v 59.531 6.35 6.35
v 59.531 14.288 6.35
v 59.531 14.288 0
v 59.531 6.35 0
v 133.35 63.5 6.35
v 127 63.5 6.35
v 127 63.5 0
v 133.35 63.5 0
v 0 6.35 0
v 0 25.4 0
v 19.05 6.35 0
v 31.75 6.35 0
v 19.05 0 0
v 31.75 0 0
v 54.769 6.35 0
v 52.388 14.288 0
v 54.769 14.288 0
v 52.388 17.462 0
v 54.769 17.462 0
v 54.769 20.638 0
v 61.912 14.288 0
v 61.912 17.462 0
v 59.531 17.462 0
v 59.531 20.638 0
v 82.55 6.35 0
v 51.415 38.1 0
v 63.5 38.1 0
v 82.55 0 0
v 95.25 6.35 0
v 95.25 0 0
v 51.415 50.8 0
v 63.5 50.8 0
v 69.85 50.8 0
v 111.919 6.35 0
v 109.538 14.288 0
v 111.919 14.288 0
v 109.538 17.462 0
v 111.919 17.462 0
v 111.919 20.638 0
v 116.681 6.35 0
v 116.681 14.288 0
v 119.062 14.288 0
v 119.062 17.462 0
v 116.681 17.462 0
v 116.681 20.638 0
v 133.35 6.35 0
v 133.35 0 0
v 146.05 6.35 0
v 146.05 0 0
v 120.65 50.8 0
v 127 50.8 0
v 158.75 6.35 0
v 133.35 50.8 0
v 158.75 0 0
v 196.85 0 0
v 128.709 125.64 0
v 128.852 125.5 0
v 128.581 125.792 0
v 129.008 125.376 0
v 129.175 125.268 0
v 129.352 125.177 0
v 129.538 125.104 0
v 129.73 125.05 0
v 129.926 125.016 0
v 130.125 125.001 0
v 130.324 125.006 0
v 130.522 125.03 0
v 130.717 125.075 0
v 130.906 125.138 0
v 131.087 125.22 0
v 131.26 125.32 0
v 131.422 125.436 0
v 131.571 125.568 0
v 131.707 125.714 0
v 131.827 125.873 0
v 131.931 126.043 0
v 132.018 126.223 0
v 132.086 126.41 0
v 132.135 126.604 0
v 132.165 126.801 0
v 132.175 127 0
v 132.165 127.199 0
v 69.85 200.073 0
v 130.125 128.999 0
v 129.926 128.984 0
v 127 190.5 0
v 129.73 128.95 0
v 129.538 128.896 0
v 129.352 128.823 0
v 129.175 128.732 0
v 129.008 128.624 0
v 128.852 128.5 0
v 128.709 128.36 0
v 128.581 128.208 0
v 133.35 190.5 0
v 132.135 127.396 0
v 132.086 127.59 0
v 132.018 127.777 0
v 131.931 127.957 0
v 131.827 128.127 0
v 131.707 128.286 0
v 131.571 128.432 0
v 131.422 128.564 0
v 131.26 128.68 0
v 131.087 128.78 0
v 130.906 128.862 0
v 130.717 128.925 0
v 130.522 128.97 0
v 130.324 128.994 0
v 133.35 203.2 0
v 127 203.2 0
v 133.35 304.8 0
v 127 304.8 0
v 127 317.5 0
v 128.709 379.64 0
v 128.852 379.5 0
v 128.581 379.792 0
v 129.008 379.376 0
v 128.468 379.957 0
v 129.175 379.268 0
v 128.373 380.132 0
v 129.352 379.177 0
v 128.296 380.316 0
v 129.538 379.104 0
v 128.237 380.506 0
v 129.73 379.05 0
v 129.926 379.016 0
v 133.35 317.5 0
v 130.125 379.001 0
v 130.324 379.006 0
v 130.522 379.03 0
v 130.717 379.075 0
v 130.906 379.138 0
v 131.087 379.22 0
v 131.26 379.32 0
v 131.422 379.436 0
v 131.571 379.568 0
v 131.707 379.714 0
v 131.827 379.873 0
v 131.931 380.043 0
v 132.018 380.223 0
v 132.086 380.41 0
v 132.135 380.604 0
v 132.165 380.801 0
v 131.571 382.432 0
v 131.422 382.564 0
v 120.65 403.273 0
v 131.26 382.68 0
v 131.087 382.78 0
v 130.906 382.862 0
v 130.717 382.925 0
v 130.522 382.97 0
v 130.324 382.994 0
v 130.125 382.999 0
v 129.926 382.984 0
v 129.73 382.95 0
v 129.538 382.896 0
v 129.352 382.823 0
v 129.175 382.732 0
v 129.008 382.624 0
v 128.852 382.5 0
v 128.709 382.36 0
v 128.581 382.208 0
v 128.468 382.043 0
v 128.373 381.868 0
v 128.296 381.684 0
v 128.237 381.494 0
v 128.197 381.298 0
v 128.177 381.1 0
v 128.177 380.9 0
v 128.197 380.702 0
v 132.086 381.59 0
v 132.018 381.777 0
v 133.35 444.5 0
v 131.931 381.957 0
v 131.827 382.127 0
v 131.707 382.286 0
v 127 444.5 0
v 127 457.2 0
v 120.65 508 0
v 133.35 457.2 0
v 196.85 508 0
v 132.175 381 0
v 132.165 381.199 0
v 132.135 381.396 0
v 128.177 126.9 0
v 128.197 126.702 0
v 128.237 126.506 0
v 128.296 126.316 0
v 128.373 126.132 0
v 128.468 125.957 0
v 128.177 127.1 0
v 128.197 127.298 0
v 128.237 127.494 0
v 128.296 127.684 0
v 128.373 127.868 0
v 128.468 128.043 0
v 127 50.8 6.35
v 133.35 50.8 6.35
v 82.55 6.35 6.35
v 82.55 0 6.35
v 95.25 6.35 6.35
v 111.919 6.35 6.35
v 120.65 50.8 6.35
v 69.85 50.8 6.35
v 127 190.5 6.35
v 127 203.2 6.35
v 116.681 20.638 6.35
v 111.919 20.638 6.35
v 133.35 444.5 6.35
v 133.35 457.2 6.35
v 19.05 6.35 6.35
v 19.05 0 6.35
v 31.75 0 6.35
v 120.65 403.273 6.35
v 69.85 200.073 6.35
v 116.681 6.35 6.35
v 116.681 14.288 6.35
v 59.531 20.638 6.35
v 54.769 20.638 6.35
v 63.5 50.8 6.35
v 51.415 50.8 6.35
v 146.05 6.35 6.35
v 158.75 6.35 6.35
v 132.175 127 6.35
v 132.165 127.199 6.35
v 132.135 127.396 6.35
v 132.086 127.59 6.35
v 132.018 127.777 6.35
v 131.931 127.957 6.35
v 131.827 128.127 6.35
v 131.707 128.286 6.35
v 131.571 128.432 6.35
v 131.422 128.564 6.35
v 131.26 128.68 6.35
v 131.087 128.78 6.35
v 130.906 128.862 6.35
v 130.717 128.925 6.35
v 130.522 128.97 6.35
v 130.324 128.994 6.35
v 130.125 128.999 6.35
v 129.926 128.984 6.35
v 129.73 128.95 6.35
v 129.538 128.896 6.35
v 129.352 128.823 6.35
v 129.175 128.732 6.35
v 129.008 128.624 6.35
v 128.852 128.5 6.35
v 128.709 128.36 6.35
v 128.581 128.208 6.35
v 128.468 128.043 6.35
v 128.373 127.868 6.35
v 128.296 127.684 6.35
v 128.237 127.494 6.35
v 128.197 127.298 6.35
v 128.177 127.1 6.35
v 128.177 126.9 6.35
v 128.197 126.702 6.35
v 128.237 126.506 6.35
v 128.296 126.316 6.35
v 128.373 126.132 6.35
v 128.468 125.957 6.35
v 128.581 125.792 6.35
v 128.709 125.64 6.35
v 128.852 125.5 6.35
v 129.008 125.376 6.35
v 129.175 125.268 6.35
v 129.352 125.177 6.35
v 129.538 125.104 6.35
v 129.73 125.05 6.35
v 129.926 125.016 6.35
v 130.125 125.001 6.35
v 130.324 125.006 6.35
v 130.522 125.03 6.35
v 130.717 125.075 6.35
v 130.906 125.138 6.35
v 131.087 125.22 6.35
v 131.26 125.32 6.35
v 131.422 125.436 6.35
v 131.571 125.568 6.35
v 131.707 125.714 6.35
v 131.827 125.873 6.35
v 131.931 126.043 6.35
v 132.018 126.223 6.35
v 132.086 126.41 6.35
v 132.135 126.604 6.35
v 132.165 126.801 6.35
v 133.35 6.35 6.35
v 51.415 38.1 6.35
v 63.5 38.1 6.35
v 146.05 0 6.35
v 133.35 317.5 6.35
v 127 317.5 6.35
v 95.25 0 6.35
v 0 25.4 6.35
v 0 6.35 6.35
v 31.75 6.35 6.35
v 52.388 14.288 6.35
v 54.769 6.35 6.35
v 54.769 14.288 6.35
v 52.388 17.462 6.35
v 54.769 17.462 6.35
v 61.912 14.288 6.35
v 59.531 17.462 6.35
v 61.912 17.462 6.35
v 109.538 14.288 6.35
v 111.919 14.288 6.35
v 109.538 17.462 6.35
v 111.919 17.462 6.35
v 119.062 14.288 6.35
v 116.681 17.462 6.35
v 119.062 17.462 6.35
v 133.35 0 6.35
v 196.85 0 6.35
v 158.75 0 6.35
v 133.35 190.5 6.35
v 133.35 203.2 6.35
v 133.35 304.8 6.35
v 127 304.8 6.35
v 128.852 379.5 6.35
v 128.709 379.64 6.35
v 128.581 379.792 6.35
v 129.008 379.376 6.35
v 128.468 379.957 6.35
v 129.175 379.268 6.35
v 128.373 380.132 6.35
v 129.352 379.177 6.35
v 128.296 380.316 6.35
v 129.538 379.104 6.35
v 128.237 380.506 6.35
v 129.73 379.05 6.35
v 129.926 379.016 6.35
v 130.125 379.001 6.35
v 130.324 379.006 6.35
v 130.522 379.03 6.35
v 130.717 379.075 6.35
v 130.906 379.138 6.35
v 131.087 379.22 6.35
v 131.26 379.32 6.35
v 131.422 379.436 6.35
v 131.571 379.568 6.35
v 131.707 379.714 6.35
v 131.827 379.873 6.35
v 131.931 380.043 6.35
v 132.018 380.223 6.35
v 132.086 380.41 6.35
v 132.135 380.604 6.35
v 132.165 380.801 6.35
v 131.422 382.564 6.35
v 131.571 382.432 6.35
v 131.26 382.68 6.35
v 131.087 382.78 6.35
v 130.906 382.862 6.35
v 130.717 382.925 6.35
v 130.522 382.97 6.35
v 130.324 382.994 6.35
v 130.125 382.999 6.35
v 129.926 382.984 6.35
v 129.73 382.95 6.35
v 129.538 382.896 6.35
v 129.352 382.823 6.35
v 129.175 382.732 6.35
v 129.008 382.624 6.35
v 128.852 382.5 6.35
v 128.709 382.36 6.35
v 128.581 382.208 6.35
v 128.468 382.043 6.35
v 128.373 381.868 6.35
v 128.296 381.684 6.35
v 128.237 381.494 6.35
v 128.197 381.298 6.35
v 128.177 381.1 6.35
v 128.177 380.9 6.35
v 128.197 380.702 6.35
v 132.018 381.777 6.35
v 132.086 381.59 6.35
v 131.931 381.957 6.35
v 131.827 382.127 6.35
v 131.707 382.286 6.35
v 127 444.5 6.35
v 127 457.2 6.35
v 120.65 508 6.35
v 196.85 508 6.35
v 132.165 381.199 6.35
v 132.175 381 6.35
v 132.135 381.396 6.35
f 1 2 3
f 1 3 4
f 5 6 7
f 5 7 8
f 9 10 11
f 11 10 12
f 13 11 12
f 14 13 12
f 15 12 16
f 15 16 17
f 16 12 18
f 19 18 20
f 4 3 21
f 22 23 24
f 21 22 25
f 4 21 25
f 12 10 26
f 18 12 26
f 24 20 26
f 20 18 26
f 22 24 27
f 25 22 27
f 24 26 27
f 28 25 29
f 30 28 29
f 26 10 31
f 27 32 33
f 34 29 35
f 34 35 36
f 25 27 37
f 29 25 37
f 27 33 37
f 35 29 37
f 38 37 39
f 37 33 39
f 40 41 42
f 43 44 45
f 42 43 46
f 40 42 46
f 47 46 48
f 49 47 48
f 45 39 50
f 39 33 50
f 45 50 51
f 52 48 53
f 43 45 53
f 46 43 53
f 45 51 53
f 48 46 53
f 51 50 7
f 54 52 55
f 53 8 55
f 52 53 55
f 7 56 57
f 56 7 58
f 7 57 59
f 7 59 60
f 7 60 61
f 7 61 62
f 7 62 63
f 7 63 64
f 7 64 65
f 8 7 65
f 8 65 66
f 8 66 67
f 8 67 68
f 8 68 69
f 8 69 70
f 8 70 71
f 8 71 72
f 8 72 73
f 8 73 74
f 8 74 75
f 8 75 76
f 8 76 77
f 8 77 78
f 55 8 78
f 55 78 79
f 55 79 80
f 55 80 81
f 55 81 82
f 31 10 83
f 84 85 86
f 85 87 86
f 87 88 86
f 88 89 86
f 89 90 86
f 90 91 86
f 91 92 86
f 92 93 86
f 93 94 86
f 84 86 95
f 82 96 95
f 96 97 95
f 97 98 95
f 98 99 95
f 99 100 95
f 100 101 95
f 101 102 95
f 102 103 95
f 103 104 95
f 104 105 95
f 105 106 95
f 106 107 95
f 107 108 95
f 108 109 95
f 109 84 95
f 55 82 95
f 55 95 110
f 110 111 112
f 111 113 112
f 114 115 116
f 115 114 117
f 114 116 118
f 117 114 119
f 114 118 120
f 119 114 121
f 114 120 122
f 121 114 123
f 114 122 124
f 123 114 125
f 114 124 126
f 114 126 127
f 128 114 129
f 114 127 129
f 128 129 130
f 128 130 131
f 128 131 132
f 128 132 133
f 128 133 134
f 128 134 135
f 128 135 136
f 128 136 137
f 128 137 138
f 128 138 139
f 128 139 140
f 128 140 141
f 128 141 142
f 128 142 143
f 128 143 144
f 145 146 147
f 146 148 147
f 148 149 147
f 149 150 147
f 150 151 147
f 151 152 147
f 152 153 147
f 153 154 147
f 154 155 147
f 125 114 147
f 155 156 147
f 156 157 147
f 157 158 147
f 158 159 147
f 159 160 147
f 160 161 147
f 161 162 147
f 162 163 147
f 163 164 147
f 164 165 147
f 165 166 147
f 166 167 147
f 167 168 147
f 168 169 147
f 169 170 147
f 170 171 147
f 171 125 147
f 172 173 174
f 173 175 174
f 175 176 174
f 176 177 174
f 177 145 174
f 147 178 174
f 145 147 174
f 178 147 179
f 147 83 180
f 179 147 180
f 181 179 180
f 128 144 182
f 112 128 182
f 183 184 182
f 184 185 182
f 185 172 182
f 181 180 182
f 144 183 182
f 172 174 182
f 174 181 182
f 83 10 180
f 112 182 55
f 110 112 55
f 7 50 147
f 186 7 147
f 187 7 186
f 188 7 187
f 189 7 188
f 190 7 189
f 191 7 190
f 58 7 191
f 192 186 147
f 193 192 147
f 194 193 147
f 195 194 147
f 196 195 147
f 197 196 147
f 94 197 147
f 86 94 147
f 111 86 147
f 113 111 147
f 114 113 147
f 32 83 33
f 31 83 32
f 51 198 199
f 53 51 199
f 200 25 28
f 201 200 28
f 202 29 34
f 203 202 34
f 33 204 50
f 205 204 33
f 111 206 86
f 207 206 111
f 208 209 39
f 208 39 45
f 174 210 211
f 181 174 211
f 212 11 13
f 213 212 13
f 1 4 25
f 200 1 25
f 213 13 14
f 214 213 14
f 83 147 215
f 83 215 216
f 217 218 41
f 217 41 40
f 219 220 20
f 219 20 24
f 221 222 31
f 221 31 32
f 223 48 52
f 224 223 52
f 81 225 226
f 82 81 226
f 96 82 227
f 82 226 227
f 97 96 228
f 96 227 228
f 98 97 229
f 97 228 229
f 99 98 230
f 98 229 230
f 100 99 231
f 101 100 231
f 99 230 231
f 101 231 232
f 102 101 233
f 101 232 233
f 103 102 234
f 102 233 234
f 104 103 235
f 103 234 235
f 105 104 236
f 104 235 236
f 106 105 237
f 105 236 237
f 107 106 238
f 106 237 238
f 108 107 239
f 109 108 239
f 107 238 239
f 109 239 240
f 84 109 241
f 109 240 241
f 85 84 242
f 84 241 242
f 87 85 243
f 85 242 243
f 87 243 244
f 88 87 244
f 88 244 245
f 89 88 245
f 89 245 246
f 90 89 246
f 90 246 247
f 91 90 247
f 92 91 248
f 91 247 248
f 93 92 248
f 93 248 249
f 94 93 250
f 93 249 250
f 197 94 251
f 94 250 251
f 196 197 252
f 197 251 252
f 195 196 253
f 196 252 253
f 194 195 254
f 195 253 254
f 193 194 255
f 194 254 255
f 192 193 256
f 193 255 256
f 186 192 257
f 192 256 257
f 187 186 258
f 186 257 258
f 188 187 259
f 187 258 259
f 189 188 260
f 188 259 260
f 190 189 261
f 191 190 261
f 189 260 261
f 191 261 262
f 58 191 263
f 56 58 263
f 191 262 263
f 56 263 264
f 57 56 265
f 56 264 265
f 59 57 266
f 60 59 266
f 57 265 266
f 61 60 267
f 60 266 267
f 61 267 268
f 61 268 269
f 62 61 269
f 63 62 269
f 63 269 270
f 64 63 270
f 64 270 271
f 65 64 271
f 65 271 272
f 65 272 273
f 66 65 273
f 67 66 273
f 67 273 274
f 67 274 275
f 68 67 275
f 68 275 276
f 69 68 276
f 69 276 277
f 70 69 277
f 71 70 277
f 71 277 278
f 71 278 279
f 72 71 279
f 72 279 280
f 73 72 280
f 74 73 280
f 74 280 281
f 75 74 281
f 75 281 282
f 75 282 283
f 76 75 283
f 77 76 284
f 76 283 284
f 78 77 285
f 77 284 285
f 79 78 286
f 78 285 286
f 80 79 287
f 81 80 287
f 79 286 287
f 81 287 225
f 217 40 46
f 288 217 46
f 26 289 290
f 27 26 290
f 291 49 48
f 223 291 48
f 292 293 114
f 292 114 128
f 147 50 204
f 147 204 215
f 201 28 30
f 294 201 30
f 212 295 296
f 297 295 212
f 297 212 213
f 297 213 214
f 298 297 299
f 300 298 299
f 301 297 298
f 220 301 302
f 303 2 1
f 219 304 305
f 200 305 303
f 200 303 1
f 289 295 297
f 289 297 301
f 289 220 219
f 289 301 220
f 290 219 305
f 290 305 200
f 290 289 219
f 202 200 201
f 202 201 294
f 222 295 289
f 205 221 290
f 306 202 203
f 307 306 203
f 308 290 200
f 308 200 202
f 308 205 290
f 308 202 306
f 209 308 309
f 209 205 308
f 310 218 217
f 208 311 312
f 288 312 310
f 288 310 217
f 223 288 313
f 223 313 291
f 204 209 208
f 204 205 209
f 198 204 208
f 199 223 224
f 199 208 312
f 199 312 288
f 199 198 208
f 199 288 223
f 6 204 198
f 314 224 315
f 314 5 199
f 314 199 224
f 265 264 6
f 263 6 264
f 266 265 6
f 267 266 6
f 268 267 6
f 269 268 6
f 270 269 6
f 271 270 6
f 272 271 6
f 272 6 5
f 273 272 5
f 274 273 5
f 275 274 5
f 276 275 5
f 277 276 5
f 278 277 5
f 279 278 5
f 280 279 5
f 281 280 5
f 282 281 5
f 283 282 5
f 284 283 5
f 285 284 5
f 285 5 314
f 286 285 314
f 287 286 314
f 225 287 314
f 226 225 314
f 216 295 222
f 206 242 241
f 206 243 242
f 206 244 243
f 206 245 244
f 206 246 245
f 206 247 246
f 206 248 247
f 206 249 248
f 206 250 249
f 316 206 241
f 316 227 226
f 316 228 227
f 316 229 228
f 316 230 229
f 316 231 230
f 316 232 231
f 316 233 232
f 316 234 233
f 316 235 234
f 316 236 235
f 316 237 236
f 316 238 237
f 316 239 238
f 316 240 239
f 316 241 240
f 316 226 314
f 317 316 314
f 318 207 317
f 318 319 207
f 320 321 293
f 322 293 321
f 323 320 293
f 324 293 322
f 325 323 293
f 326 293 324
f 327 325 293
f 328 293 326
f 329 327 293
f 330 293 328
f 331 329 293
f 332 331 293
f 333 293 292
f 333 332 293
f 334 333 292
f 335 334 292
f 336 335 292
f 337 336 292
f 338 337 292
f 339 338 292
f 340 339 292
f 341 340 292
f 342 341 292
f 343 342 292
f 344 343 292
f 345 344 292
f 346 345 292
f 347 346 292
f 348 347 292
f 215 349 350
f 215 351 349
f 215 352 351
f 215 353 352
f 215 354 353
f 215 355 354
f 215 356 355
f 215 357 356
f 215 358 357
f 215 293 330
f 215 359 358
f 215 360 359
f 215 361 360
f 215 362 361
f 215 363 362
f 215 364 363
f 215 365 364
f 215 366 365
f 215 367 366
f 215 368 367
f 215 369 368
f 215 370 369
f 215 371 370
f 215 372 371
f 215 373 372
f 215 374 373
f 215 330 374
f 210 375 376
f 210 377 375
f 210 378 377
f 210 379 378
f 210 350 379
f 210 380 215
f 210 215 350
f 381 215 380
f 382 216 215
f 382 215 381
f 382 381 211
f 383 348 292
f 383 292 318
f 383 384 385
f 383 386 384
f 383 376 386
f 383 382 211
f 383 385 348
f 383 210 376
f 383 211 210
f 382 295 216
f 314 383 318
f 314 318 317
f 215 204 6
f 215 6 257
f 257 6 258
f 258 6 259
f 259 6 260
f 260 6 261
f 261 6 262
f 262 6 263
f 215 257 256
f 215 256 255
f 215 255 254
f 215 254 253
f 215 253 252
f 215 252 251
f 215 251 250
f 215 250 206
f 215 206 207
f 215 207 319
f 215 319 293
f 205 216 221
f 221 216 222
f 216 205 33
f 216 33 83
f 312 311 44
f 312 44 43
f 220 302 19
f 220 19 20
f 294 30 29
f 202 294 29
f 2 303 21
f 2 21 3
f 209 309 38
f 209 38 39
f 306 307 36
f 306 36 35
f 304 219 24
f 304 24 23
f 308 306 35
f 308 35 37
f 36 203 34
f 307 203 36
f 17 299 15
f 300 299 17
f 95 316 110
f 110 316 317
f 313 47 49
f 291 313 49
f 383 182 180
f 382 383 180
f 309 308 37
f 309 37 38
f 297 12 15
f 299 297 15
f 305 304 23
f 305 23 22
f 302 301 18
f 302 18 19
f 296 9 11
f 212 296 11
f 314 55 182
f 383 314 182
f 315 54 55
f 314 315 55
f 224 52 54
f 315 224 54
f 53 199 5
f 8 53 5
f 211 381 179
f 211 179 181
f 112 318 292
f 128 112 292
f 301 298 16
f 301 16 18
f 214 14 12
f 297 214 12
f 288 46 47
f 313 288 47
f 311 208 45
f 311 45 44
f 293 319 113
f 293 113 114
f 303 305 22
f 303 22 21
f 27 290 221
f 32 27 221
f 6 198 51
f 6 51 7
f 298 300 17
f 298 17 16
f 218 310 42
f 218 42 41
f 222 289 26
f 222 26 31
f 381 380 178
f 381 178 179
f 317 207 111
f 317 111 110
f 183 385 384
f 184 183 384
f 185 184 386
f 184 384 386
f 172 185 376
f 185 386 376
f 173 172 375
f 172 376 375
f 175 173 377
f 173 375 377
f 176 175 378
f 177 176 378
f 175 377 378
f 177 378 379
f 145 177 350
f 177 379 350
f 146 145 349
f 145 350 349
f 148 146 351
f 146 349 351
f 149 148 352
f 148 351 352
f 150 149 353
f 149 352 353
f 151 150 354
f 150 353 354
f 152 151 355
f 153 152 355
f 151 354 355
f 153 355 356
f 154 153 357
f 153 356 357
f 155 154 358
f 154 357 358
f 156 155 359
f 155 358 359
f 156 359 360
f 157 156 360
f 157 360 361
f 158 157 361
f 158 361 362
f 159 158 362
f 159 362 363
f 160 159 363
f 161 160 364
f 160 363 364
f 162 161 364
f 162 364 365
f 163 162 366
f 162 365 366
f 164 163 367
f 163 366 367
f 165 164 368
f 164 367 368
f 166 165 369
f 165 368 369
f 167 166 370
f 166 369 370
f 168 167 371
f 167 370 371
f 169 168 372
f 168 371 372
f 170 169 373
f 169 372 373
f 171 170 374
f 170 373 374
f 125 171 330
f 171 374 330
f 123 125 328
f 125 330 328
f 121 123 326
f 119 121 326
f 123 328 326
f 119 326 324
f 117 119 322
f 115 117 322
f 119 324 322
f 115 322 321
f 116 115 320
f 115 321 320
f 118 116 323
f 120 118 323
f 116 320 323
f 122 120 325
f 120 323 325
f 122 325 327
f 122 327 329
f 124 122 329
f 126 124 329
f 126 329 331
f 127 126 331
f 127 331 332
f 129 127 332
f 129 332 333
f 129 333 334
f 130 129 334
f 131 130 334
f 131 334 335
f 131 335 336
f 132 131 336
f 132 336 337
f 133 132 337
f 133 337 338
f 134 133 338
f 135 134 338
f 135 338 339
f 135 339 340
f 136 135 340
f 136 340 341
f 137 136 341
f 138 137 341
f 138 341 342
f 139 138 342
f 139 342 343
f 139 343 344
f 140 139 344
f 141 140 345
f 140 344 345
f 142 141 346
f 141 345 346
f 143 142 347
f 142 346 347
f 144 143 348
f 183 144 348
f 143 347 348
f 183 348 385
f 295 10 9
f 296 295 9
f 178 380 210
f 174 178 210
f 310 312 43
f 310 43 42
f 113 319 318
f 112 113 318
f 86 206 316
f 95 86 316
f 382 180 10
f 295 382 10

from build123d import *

# Parameters (mm, degrees)
BOSS_EXTRUDE1_DEPTH = 6.35
CUT_EXTRUDE1_DEPTH  = 6.35
SKETCH4_R           = 2
SKETCH4_W           = 6.35
SKETCH4_H           = 12.7
CUT_EXTRUDE5_DEPTH  = 6.35
SKETCH6_W           = 6.35
SKETCH6_H           = 12.7
CUT_EXTRUDE6_DEPTH  = 6.35
CUT_EXTRUDE7_DEPTH  = 6.35
SKETCH5_W           = 6.35
SKETCH5_H           = 12.7
CUT_EXTRUDE4_DEPTH  = 6.35


with BuildPart() as part:
    # Sketch1 → Boss-Extrude1 (new body)
    with BuildSketch(Plane.XY):
        Polygon((190.5, 508), (120.65, 508), (0, 25.4), (0, 6.35), (19.05, 6.35), (19.05, 0), (31.75, 0), (31.75, 6.35), (82.55, 6.35), (82.55, 0), (95.25, 0), (95.25, 6.35), (133.35, 6.35), (133.35, 0), (146.05, 0), (146.05, 6.35), (158.75, 6.35), (158.75, 0), (190.5, 0), (196.85, 0), (196.85, 508), align=None)
        Polygon((120.65, 50.8), (120.65, 403.273117109), (82.55, 250.873117109), (82.55, 50.8), align=None, mode=Mode.SUBTRACT)
    extrude(amount=BOSS_EXTRUDE1_DEPTH)

    # Sketch2 → Cut-Extrude1 (cut)
    with BuildSketch(Plane.XY.offset(6.35)):
        Polygon((59.53125, 6.35), (54.76875, 6.35), (54.76875, 14.2875), (52.3875, 14.2875), (52.3875, 17.4625), (54.76875, 17.4625), (54.76875, 20.6375), (59.53125, 20.6375), (59.53125, 17.4625), (61.9125, 17.4625), (61.9125, 14.2875), (59.53125, 14.2875), align=None)
        Polygon((116.68125, 6.35), (111.91875, 6.35), (111.91875, 14.2875), (109.5375, 14.2875), (109.5375, 17.4625), (111.91875, 17.4625), (111.91875, 20.6375), (116.68125, 20.6375), (116.68125, 17.4625), (119.0625, 17.4625), (119.0625, 14.2875), (116.68125, 14.2875), align=None)
    extrude(amount=-CUT_EXTRUDE1_DEPTH, mode=Mode.SUBTRACT)

    # Sketch4 → Cut-Extrude5 (cut)
    with BuildSketch(Plane.XY.offset(6.35)):
        with Locations((130.175, 127)):
            Circle(SKETCH4_R)
        with Locations((130.175, 381)):
            Circle(SKETCH4_R)
        with Locations((130.175, 196.85)):
            Rectangle(SKETCH4_W, SKETCH4_H)
        with Locations((130.175, 57.15)):
            Rectangle(SKETCH4_W, SKETCH4_H)
        with Locations((130.175, 450.85)):
            Rectangle(SKETCH4_W, SKETCH4_H)
        with Locations((130.175, 311.15)):
            Rectangle(SKETCH4_W, SKETCH4_H)
    extrude(amount=-CUT_EXTRUDE5_DEPTH, mode=Mode.SUBTRACT)

    # Sketch6 → Cut-Extrude6 (cut)
    with BuildSketch(Plane.XY.offset(6.35)):
        with Locations((60.325, 44.45)):
            Rectangle(SKETCH6_W, SKETCH6_H)
    extrude(amount=-CUT_EXTRUDE6_DEPTH, mode=Mode.SUBTRACT)

    # Sketch7 → Cut-Extrude7 (cut)
    with BuildSketch(Plane.XY.offset(6.35)):
        Polygon((82.55, 50.8), (69.85, 50.8), (69.85, 200.073117109), (82.55, 250.873117109), align=None)
    extrude(amount=-CUT_EXTRUDE7_DEPTH, mode=Mode.SUBTRACT)

    # Sketch5 → Cut-Extrude4 (cut)
    with BuildSketch(Plane.XY.offset(6.35)):
        with Locations((54.590058309, 44.45)):
            Rectangle(SKETCH5_W, SKETCH5_H)
    extrude(amount=-CUT_EXTRUDE4_DEPTH, mode=Mode.SUBTRACT)


solid = part.part
